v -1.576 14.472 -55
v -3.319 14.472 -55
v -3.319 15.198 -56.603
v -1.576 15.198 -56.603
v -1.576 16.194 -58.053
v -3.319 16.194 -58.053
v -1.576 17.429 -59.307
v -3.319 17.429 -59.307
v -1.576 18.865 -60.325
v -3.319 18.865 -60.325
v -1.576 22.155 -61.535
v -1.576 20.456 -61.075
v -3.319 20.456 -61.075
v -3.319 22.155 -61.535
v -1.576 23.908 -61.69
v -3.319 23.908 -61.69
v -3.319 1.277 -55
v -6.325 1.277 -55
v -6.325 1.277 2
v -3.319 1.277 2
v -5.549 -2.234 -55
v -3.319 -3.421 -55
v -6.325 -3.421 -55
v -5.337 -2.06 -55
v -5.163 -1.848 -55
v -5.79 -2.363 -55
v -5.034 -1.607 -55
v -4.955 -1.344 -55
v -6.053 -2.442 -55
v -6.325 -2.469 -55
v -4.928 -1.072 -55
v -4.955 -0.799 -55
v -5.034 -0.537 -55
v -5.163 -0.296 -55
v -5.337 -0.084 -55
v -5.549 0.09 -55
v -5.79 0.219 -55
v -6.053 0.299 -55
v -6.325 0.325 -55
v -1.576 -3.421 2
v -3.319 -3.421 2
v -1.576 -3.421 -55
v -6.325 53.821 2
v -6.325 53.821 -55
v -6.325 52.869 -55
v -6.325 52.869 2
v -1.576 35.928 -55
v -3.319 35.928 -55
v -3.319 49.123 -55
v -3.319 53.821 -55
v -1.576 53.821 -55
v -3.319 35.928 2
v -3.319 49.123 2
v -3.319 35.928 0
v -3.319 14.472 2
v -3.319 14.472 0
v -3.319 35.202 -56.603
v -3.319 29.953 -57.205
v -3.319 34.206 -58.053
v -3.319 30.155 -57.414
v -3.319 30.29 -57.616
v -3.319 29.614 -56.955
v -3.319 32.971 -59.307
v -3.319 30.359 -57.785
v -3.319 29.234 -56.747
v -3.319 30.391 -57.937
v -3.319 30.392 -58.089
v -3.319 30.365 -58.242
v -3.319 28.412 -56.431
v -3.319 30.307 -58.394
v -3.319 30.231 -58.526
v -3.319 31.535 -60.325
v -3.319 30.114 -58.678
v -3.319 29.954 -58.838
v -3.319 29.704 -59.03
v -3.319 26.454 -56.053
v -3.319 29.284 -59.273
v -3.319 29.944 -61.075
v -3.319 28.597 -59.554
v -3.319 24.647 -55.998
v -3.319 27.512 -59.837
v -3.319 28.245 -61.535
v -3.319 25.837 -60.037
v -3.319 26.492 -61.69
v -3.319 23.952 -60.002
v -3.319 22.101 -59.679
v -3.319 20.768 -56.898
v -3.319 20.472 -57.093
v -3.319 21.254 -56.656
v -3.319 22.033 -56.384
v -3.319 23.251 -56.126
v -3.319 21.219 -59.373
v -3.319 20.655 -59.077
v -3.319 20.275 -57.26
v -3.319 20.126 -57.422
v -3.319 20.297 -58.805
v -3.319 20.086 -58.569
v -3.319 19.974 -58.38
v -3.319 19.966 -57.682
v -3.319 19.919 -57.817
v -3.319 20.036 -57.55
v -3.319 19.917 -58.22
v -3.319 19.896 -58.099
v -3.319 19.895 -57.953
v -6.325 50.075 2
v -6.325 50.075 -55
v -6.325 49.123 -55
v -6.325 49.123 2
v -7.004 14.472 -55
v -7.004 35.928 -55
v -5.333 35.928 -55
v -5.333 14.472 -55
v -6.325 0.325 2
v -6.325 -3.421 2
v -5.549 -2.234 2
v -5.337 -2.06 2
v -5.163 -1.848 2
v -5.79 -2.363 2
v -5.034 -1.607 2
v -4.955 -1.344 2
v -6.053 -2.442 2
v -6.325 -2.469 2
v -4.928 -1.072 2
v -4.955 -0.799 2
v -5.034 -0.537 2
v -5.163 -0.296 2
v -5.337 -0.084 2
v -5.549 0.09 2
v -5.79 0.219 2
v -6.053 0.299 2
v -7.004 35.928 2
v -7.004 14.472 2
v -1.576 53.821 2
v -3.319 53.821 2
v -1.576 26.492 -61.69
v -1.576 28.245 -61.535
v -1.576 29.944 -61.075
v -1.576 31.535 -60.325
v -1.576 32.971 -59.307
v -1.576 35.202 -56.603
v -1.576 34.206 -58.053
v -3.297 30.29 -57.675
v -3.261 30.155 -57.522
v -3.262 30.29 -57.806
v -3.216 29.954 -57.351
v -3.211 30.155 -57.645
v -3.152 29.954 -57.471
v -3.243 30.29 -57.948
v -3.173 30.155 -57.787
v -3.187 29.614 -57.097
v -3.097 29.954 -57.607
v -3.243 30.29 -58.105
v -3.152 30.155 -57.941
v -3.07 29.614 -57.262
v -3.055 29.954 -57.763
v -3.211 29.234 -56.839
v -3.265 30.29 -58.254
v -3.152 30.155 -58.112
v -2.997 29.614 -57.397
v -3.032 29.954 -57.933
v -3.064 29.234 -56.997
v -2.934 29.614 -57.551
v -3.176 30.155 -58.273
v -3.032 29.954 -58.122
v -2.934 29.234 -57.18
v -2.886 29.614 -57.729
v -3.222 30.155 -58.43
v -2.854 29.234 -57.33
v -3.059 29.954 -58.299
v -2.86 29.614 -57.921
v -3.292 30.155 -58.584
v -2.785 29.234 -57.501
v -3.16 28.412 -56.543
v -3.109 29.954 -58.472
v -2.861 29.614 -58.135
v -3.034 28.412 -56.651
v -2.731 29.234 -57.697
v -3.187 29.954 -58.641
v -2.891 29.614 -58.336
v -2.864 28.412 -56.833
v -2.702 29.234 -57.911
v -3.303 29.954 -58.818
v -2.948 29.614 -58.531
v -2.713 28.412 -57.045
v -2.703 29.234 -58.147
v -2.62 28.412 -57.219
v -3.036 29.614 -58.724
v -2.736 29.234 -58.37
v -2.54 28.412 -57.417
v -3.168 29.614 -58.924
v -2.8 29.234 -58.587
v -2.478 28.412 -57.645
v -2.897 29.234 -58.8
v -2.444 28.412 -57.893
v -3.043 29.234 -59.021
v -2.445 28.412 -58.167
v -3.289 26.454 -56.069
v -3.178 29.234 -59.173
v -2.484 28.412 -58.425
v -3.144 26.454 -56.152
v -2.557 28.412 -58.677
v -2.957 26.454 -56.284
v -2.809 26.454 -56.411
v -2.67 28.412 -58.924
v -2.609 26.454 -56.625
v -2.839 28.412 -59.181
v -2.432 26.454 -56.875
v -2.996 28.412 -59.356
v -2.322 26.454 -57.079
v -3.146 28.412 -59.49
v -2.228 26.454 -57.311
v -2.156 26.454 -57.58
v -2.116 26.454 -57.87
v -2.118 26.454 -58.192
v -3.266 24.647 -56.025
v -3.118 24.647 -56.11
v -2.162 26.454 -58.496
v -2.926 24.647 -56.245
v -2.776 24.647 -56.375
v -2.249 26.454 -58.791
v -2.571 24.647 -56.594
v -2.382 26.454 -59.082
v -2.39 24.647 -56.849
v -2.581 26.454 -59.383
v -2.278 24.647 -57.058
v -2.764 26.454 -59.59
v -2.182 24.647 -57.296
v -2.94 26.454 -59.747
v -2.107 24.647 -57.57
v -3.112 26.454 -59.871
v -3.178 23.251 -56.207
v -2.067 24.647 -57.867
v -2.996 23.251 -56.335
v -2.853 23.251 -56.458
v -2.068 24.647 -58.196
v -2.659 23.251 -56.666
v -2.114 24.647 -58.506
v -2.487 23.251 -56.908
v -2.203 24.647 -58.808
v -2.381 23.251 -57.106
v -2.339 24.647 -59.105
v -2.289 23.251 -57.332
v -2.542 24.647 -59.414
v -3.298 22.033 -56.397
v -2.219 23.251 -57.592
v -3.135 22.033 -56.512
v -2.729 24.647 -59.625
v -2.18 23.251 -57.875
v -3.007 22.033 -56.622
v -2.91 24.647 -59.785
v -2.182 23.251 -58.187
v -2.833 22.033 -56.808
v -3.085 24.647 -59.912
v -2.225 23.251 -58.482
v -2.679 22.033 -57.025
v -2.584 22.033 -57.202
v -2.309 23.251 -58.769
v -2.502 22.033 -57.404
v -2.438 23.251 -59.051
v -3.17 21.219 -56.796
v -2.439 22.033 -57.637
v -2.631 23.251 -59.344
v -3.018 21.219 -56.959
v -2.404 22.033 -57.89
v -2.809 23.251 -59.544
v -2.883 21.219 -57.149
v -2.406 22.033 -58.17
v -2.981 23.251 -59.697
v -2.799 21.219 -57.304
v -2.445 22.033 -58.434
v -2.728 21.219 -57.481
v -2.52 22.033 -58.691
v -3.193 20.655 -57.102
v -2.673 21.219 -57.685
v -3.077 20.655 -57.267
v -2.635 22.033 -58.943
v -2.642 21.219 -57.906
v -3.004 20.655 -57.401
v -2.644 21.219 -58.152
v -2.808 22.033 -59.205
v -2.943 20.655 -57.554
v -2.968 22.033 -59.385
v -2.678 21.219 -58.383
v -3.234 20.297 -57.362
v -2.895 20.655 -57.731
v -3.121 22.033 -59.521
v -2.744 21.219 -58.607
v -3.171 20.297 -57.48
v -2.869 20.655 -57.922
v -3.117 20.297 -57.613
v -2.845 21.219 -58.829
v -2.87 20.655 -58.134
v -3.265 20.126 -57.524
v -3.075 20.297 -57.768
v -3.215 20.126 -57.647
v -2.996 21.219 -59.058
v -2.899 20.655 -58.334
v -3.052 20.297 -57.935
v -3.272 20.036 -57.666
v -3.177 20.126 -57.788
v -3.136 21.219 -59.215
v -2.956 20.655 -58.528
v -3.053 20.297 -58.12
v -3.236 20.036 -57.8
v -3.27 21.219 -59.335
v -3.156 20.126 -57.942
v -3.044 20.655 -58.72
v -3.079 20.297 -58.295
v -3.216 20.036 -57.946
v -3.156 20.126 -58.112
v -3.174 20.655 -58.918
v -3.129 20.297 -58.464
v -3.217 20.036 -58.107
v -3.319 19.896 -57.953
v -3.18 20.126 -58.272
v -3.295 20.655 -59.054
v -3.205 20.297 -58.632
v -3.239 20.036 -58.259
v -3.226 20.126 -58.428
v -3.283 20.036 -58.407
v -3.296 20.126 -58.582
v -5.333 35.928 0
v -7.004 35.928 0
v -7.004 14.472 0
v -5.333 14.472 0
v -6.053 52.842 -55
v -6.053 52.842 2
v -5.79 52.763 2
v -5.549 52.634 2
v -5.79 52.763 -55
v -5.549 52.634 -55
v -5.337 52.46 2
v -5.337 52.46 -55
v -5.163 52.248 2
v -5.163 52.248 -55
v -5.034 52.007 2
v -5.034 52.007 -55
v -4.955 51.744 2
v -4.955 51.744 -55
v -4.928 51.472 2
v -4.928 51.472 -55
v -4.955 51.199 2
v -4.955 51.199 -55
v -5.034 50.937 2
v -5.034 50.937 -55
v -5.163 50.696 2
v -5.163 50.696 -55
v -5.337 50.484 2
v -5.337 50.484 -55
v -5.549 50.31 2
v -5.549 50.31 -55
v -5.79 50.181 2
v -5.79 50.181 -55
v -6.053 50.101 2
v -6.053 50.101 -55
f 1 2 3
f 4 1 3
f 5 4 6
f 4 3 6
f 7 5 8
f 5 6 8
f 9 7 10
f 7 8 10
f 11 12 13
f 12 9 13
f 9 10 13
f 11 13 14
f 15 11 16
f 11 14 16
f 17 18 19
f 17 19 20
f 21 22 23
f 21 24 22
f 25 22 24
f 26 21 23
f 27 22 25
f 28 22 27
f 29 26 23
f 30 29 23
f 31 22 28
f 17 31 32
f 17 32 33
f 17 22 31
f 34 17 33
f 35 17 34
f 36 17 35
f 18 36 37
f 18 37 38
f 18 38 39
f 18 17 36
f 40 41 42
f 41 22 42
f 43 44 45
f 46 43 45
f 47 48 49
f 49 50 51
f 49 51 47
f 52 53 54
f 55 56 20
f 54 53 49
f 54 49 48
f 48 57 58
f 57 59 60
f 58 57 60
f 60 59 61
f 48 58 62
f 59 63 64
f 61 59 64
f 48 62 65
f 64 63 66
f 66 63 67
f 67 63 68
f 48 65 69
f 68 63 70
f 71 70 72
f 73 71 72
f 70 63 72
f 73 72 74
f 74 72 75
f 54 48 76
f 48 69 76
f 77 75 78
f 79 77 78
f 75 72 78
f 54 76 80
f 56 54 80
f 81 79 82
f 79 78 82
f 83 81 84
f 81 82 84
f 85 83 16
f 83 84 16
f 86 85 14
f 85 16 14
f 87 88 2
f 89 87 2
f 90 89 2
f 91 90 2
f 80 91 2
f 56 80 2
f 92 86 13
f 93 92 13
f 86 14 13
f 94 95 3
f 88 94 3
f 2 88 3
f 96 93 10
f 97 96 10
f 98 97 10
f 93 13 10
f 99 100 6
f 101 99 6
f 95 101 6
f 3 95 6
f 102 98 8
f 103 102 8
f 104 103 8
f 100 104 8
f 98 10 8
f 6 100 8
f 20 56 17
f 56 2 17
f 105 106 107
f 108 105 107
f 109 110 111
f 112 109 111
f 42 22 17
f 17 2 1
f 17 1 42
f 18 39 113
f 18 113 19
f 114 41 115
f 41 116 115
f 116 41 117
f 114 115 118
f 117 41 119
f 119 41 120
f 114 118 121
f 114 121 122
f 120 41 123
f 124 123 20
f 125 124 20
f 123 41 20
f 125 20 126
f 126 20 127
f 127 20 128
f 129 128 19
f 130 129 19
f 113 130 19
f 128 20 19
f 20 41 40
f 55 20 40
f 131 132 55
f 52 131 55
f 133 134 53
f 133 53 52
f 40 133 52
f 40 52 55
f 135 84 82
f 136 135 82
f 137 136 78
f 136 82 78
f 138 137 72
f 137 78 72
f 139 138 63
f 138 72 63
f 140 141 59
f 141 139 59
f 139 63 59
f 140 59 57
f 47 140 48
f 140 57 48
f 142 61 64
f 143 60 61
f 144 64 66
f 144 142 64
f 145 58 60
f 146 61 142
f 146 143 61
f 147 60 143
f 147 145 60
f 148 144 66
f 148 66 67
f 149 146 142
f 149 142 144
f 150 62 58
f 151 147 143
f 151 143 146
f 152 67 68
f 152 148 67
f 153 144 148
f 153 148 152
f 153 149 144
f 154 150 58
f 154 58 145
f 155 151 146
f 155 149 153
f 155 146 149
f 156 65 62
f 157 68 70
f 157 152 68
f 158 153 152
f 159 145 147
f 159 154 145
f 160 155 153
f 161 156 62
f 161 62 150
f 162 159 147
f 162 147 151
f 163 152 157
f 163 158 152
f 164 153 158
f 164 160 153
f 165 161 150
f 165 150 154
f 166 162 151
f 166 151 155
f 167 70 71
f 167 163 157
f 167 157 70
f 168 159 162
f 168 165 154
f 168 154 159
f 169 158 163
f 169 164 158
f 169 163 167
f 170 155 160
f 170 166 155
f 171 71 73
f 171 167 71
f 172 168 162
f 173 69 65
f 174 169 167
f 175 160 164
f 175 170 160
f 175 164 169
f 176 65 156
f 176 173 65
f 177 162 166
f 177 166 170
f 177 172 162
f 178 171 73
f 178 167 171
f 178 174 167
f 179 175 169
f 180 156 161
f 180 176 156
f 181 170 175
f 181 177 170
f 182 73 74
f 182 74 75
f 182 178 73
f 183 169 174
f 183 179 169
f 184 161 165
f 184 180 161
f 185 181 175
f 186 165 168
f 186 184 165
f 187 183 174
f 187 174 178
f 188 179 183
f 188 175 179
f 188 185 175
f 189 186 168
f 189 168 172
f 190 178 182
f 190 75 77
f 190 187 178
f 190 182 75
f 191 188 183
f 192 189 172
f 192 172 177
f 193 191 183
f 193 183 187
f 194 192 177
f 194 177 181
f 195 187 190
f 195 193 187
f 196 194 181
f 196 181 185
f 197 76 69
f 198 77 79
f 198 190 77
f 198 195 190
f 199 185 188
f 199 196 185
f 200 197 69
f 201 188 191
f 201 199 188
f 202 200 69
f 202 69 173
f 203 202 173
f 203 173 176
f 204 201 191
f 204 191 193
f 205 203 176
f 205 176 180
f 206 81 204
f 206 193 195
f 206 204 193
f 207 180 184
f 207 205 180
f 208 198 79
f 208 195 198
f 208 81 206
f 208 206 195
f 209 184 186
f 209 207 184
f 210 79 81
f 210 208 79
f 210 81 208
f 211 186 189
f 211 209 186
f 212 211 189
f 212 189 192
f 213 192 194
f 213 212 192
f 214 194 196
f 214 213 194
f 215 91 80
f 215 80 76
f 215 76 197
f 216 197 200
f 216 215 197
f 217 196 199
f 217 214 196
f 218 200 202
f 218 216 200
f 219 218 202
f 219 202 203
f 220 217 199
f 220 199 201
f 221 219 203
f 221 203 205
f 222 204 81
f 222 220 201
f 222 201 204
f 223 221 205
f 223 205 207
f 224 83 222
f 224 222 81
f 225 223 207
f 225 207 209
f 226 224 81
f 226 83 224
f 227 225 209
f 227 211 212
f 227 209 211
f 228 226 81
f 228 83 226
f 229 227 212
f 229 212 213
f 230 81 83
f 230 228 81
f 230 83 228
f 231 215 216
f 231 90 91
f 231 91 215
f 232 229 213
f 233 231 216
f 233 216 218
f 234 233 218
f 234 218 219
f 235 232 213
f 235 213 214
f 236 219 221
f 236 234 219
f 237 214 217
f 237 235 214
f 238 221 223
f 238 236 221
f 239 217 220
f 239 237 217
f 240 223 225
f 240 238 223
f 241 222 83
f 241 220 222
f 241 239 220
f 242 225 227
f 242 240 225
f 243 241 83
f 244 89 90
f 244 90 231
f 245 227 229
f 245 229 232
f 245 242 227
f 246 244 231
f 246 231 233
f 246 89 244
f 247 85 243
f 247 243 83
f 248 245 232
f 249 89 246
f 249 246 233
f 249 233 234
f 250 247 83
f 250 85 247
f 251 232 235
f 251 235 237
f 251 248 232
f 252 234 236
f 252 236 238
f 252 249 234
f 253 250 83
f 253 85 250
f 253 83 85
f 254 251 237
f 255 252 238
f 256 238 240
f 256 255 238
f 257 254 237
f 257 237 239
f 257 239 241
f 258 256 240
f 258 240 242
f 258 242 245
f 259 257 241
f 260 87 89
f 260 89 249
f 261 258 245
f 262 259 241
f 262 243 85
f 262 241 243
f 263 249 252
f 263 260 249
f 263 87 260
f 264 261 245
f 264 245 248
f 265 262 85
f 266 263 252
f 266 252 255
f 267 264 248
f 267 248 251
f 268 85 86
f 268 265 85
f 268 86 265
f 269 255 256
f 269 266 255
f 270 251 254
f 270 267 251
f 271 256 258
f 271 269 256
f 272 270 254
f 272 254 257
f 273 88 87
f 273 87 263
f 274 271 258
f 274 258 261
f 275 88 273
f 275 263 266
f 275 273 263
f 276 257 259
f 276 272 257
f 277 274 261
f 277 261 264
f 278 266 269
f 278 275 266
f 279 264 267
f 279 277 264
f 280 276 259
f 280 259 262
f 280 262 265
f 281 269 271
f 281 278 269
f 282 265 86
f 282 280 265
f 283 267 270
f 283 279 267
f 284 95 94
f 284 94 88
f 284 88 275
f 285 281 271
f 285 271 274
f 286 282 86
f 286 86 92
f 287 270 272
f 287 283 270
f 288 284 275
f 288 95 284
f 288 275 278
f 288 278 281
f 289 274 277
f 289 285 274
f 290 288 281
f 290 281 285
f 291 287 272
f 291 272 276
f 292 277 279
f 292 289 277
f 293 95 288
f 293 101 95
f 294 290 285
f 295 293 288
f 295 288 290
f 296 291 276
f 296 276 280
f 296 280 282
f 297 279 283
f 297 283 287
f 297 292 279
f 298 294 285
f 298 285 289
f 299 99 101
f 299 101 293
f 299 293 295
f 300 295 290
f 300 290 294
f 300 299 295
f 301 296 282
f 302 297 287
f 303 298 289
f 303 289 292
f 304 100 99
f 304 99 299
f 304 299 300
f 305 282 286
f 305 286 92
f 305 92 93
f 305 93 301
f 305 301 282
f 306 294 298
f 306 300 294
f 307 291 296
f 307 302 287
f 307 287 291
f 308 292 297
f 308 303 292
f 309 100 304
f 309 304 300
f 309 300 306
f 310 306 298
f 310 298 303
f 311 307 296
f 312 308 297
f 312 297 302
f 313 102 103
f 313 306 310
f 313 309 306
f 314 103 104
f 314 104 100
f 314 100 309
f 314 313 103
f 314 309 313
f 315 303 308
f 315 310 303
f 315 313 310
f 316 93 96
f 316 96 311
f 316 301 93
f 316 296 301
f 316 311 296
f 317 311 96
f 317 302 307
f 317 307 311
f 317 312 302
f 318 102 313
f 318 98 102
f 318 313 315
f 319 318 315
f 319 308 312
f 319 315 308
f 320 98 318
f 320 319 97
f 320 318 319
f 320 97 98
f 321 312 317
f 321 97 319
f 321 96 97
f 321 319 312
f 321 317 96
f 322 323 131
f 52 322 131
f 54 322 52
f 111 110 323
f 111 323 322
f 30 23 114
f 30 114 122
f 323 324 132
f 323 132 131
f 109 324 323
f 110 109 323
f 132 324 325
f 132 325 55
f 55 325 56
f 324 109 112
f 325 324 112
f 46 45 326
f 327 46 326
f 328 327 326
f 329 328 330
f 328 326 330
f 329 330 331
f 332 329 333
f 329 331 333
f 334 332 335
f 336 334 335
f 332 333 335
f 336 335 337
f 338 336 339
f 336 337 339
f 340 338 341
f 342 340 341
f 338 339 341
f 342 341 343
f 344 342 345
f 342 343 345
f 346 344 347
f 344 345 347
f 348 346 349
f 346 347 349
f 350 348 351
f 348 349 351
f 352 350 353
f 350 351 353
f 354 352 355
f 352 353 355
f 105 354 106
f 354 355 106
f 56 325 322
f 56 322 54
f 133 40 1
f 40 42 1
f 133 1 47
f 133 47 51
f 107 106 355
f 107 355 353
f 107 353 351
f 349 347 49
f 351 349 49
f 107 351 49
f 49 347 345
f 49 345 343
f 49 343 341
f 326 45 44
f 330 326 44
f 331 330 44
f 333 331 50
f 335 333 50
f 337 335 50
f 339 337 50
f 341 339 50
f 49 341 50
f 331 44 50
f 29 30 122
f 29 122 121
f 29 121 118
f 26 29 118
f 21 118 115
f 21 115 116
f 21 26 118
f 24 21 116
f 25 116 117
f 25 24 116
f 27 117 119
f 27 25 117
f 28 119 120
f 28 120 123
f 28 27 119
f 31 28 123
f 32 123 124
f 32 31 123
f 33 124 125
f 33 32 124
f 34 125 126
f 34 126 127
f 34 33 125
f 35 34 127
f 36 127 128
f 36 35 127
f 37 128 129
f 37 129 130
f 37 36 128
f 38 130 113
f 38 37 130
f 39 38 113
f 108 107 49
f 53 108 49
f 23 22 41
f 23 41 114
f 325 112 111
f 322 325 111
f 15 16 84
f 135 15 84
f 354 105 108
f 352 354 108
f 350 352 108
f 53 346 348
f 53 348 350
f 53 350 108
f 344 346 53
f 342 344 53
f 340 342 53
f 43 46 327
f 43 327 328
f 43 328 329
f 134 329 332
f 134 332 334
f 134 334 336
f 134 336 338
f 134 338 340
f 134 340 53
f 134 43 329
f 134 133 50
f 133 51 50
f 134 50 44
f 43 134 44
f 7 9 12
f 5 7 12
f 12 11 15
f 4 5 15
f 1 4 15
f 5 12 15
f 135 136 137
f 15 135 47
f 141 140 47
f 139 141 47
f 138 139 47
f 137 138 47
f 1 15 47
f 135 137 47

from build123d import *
from build123d.topology import SkipClean

# Parameters (mm, degrees)
CROQUIS1_W                = 1.742923262
CROQUIS1_H                = 57.241679132
SALIENTE_EXTRUIR1_DEPTH   = 55
CROQUIS1_W_2              = 1.671507147
CROQUIS1_H_2              = 21.456626134
SALIENTE_EXTRUIR1_2_DEPTH = 55
CROQUIS2_W                = 3.684913484
CROQUIS2_H                = 21.456626134
SALIENTE_EXTRUIR2_DEPTH   = 2
CROQUIS3_W                = 6.689505602
CROQUIS3_H                = 21.456626134
SALIENTE_EXTRUIR3_DEPTH   = 1.742923
REDONDEO1_R               = 10
SALIENTE_EXTRUIR4_DEPTH   = 57


with BuildPart() as part:
    # Croquis1 → Saliente-Extruir1 (new body)
    with BuildSketch(Plane.XY):
        with Locations((-2.447737274, 25.2)):
            Rectangle(CROQUIS1_W, CROQUIS1_H)
    extrude(amount=-SALIENTE_EXTRUIR1_DEPTH)



with BuildPart() as body_2:
    # Croquis1 → Saliente-Extruir1 2 (new body)
    with BuildSketch(Plane.XY):
        with Locations((-6.168358816, 25.2)):
            Rectangle(CROQUIS1_W_2, CROQUIS1_H_2)
    extrude(amount=-SALIENTE_EXTRUIR1_2_DEPTH)


with BuildPart() as part_1:
    add(part.part)

    add(body_2.part)  # Saliente-Extruir2 merges body 2
    # Croquis2 → Saliente-Extruir2 (add)
    with BuildSketch(Plane.XY):
        with Locations((-5.161655647, 25.2)):
            Rectangle(CROQUIS2_W, CROQUIS2_H)
        Polygon((-3.319198905, 53.820839566), (-3.319198905, 35.928313067), (-3.319198905, 14.471686933), (-3.319198905, -3.420839566), (-1.576275643, -3.420839566), (-1.576275643, 14.471686933), (-1.576275643, 35.928313067), (-1.576275643, 53.820839566), align=None)
    extrude(amount=SALIENTE_EXTRUIR2_DEPTH)

    # Croquis3 → Saliente-Extruir3 (add, through all)
    with SkipClean():  # the faces are left unmerged after this step: merging them gives an invalid solid
        with BuildSketch(Plane.ZY.offset(3.319198905)):
            with Locations((-58.344752801, 25.2)):
                Rectangle(CROQUIS3_W, CROQUIS3_H)
        extrude(amount=-SALIENTE_EXTRUIR3_DEPTH)

    # Redondeo1
    # the kernel refuses this fillet: 10 mm, written as the material it takes off along each edge
    with BuildSketch(Plane(origin=(-26.909534167, 14.471686933, -61.689505602), x_dir=(0, 0, 1), z_dir=(1, 0, 0))) as redondeo1_piece_1:
        with BuildLine():
            CenterArc((10, -9.436134105), REDONDEO1_R, 109.332484587, 70.667515413)
            Line((0, -9.436134105), (-0.2, -9.436134105))
            Line((-0.2, -9.436134105), (-0.2, 0))
            Line((-0.2, 0), (0, 0.2))
            ThreePointArc((0, 0.2), (3.344752801, 0.2), (6.623295714, 0.188722682))
            Line((6.623295714, 0.188722682), (6.689505602, 0))
        make_face()
    extrude(amount=48.923593524, mode=Mode.SUBTRACT)
    with BuildSketch(Plane(origin=(-26.909534167, 35.928313067, -61.689505602), x_dir=(0, -1, 0), z_dir=(1, 0, 0))) as redondeo1_piece_2:
        with BuildLine():
            CenterArc((9.436134105, -10), REDONDEO1_R, 90, 70.667515413)
            Line((0, -6.689505602), (-0.188722682, -6.623295714))
            ThreePointArc((-0.188722682, -6.623295714), (-0.2, -3.344752801), (-0.2, 0))
            Line((-0.2, 0), (0, 0.2))
            Line((0, 0.2), (9.436134105, 0.2))
            Line((9.436134105, 0.2), (9.436134105, 0))
        make_face()
    extrude(amount=48.923593524, mode=Mode.SUBTRACT)

    # Croquis6 → Cortar-Revolución4 (revolve, cut)
    with SkipClean():  # the faces are left unmerged after this step: merging them gives an invalid solid
        with BuildSketch(Plane.ZY.offset(4.319198905)):
            with BuildLine():
                Line((-58.022003986, 30.9962324), (-58.022003986, 19.291046994))
                add(Edge.make_bspline(
                    [(-58.022003986, 30.9962324), (-60.287786898, 30.9962324), (-60.287786898, 25.143639697), (-60.287786898, 19.291046994), (-58.022003986, 19.291046994)],
                    knots=[3.141592654, 3.141592654, 3.141592654, 4.71238898, 4.71238898, 6.283185307, 6.283185307, 6.283185307], degree=2, weights=[1, 0.707106781, 1, 0.707106781, 1]))
            make_face()
        revolve(axis=Axis((-4.319198905, 19.291046994, -58.022003986), (0, 1, 0)), mode=Mode.SUBTRACT)

    # Croquis7 → Saliente-Extruir4 (add)
    with SkipClean():  # the faces are left unmerged after this step: merging them gives an invalid solid
        with BuildSketch(Plane(origin=(0, 0, -55), x_dir=(-1, 0, 0), z_dir=(0, 0, -1))):
            with BuildLine():
                Line((6.325110646, 50.074635433), (6.325110646, 49.12294906))
                Line((6.325110646, 49.12294906), (3.319198905, 49.12294906))
                Line((3.319198905, 49.12294906), (3.319198905, 53.820839566))
                Line((3.319198905, 53.820839566), (6.325110646, 53.820839566))
                Line((6.325110646, 53.820839566), (6.325110646, 52.869153193))
                ThreePointArc((6.325110646, 52.869153193), (4.927851766, 51.471894313), (6.325110646, 50.074635433))
            make_face()
            with BuildLine():
                Line((6.325110646, -3.420839566), (6.325110646, -2.469153193))
                ThreePointArc((6.325110646, -2.469153193), (4.927851766, -1.071894313), (6.325110646, 0.325364567))
                Line((6.325110646, 0.325364567), (6.325110646, 1.27705094))
                Line((6.325110646, 1.27705094), (3.319198905, 1.27705094))
                Line((3.319198905, 1.27705094), (3.319198905, -3.420839566))
                Line((3.319198905, -3.420839566), (6.325110646, -3.420839566))
            make_face()
        extrude(amount=-SALIENTE_EXTRUIR4_DEPTH)


solid = part_1.part
